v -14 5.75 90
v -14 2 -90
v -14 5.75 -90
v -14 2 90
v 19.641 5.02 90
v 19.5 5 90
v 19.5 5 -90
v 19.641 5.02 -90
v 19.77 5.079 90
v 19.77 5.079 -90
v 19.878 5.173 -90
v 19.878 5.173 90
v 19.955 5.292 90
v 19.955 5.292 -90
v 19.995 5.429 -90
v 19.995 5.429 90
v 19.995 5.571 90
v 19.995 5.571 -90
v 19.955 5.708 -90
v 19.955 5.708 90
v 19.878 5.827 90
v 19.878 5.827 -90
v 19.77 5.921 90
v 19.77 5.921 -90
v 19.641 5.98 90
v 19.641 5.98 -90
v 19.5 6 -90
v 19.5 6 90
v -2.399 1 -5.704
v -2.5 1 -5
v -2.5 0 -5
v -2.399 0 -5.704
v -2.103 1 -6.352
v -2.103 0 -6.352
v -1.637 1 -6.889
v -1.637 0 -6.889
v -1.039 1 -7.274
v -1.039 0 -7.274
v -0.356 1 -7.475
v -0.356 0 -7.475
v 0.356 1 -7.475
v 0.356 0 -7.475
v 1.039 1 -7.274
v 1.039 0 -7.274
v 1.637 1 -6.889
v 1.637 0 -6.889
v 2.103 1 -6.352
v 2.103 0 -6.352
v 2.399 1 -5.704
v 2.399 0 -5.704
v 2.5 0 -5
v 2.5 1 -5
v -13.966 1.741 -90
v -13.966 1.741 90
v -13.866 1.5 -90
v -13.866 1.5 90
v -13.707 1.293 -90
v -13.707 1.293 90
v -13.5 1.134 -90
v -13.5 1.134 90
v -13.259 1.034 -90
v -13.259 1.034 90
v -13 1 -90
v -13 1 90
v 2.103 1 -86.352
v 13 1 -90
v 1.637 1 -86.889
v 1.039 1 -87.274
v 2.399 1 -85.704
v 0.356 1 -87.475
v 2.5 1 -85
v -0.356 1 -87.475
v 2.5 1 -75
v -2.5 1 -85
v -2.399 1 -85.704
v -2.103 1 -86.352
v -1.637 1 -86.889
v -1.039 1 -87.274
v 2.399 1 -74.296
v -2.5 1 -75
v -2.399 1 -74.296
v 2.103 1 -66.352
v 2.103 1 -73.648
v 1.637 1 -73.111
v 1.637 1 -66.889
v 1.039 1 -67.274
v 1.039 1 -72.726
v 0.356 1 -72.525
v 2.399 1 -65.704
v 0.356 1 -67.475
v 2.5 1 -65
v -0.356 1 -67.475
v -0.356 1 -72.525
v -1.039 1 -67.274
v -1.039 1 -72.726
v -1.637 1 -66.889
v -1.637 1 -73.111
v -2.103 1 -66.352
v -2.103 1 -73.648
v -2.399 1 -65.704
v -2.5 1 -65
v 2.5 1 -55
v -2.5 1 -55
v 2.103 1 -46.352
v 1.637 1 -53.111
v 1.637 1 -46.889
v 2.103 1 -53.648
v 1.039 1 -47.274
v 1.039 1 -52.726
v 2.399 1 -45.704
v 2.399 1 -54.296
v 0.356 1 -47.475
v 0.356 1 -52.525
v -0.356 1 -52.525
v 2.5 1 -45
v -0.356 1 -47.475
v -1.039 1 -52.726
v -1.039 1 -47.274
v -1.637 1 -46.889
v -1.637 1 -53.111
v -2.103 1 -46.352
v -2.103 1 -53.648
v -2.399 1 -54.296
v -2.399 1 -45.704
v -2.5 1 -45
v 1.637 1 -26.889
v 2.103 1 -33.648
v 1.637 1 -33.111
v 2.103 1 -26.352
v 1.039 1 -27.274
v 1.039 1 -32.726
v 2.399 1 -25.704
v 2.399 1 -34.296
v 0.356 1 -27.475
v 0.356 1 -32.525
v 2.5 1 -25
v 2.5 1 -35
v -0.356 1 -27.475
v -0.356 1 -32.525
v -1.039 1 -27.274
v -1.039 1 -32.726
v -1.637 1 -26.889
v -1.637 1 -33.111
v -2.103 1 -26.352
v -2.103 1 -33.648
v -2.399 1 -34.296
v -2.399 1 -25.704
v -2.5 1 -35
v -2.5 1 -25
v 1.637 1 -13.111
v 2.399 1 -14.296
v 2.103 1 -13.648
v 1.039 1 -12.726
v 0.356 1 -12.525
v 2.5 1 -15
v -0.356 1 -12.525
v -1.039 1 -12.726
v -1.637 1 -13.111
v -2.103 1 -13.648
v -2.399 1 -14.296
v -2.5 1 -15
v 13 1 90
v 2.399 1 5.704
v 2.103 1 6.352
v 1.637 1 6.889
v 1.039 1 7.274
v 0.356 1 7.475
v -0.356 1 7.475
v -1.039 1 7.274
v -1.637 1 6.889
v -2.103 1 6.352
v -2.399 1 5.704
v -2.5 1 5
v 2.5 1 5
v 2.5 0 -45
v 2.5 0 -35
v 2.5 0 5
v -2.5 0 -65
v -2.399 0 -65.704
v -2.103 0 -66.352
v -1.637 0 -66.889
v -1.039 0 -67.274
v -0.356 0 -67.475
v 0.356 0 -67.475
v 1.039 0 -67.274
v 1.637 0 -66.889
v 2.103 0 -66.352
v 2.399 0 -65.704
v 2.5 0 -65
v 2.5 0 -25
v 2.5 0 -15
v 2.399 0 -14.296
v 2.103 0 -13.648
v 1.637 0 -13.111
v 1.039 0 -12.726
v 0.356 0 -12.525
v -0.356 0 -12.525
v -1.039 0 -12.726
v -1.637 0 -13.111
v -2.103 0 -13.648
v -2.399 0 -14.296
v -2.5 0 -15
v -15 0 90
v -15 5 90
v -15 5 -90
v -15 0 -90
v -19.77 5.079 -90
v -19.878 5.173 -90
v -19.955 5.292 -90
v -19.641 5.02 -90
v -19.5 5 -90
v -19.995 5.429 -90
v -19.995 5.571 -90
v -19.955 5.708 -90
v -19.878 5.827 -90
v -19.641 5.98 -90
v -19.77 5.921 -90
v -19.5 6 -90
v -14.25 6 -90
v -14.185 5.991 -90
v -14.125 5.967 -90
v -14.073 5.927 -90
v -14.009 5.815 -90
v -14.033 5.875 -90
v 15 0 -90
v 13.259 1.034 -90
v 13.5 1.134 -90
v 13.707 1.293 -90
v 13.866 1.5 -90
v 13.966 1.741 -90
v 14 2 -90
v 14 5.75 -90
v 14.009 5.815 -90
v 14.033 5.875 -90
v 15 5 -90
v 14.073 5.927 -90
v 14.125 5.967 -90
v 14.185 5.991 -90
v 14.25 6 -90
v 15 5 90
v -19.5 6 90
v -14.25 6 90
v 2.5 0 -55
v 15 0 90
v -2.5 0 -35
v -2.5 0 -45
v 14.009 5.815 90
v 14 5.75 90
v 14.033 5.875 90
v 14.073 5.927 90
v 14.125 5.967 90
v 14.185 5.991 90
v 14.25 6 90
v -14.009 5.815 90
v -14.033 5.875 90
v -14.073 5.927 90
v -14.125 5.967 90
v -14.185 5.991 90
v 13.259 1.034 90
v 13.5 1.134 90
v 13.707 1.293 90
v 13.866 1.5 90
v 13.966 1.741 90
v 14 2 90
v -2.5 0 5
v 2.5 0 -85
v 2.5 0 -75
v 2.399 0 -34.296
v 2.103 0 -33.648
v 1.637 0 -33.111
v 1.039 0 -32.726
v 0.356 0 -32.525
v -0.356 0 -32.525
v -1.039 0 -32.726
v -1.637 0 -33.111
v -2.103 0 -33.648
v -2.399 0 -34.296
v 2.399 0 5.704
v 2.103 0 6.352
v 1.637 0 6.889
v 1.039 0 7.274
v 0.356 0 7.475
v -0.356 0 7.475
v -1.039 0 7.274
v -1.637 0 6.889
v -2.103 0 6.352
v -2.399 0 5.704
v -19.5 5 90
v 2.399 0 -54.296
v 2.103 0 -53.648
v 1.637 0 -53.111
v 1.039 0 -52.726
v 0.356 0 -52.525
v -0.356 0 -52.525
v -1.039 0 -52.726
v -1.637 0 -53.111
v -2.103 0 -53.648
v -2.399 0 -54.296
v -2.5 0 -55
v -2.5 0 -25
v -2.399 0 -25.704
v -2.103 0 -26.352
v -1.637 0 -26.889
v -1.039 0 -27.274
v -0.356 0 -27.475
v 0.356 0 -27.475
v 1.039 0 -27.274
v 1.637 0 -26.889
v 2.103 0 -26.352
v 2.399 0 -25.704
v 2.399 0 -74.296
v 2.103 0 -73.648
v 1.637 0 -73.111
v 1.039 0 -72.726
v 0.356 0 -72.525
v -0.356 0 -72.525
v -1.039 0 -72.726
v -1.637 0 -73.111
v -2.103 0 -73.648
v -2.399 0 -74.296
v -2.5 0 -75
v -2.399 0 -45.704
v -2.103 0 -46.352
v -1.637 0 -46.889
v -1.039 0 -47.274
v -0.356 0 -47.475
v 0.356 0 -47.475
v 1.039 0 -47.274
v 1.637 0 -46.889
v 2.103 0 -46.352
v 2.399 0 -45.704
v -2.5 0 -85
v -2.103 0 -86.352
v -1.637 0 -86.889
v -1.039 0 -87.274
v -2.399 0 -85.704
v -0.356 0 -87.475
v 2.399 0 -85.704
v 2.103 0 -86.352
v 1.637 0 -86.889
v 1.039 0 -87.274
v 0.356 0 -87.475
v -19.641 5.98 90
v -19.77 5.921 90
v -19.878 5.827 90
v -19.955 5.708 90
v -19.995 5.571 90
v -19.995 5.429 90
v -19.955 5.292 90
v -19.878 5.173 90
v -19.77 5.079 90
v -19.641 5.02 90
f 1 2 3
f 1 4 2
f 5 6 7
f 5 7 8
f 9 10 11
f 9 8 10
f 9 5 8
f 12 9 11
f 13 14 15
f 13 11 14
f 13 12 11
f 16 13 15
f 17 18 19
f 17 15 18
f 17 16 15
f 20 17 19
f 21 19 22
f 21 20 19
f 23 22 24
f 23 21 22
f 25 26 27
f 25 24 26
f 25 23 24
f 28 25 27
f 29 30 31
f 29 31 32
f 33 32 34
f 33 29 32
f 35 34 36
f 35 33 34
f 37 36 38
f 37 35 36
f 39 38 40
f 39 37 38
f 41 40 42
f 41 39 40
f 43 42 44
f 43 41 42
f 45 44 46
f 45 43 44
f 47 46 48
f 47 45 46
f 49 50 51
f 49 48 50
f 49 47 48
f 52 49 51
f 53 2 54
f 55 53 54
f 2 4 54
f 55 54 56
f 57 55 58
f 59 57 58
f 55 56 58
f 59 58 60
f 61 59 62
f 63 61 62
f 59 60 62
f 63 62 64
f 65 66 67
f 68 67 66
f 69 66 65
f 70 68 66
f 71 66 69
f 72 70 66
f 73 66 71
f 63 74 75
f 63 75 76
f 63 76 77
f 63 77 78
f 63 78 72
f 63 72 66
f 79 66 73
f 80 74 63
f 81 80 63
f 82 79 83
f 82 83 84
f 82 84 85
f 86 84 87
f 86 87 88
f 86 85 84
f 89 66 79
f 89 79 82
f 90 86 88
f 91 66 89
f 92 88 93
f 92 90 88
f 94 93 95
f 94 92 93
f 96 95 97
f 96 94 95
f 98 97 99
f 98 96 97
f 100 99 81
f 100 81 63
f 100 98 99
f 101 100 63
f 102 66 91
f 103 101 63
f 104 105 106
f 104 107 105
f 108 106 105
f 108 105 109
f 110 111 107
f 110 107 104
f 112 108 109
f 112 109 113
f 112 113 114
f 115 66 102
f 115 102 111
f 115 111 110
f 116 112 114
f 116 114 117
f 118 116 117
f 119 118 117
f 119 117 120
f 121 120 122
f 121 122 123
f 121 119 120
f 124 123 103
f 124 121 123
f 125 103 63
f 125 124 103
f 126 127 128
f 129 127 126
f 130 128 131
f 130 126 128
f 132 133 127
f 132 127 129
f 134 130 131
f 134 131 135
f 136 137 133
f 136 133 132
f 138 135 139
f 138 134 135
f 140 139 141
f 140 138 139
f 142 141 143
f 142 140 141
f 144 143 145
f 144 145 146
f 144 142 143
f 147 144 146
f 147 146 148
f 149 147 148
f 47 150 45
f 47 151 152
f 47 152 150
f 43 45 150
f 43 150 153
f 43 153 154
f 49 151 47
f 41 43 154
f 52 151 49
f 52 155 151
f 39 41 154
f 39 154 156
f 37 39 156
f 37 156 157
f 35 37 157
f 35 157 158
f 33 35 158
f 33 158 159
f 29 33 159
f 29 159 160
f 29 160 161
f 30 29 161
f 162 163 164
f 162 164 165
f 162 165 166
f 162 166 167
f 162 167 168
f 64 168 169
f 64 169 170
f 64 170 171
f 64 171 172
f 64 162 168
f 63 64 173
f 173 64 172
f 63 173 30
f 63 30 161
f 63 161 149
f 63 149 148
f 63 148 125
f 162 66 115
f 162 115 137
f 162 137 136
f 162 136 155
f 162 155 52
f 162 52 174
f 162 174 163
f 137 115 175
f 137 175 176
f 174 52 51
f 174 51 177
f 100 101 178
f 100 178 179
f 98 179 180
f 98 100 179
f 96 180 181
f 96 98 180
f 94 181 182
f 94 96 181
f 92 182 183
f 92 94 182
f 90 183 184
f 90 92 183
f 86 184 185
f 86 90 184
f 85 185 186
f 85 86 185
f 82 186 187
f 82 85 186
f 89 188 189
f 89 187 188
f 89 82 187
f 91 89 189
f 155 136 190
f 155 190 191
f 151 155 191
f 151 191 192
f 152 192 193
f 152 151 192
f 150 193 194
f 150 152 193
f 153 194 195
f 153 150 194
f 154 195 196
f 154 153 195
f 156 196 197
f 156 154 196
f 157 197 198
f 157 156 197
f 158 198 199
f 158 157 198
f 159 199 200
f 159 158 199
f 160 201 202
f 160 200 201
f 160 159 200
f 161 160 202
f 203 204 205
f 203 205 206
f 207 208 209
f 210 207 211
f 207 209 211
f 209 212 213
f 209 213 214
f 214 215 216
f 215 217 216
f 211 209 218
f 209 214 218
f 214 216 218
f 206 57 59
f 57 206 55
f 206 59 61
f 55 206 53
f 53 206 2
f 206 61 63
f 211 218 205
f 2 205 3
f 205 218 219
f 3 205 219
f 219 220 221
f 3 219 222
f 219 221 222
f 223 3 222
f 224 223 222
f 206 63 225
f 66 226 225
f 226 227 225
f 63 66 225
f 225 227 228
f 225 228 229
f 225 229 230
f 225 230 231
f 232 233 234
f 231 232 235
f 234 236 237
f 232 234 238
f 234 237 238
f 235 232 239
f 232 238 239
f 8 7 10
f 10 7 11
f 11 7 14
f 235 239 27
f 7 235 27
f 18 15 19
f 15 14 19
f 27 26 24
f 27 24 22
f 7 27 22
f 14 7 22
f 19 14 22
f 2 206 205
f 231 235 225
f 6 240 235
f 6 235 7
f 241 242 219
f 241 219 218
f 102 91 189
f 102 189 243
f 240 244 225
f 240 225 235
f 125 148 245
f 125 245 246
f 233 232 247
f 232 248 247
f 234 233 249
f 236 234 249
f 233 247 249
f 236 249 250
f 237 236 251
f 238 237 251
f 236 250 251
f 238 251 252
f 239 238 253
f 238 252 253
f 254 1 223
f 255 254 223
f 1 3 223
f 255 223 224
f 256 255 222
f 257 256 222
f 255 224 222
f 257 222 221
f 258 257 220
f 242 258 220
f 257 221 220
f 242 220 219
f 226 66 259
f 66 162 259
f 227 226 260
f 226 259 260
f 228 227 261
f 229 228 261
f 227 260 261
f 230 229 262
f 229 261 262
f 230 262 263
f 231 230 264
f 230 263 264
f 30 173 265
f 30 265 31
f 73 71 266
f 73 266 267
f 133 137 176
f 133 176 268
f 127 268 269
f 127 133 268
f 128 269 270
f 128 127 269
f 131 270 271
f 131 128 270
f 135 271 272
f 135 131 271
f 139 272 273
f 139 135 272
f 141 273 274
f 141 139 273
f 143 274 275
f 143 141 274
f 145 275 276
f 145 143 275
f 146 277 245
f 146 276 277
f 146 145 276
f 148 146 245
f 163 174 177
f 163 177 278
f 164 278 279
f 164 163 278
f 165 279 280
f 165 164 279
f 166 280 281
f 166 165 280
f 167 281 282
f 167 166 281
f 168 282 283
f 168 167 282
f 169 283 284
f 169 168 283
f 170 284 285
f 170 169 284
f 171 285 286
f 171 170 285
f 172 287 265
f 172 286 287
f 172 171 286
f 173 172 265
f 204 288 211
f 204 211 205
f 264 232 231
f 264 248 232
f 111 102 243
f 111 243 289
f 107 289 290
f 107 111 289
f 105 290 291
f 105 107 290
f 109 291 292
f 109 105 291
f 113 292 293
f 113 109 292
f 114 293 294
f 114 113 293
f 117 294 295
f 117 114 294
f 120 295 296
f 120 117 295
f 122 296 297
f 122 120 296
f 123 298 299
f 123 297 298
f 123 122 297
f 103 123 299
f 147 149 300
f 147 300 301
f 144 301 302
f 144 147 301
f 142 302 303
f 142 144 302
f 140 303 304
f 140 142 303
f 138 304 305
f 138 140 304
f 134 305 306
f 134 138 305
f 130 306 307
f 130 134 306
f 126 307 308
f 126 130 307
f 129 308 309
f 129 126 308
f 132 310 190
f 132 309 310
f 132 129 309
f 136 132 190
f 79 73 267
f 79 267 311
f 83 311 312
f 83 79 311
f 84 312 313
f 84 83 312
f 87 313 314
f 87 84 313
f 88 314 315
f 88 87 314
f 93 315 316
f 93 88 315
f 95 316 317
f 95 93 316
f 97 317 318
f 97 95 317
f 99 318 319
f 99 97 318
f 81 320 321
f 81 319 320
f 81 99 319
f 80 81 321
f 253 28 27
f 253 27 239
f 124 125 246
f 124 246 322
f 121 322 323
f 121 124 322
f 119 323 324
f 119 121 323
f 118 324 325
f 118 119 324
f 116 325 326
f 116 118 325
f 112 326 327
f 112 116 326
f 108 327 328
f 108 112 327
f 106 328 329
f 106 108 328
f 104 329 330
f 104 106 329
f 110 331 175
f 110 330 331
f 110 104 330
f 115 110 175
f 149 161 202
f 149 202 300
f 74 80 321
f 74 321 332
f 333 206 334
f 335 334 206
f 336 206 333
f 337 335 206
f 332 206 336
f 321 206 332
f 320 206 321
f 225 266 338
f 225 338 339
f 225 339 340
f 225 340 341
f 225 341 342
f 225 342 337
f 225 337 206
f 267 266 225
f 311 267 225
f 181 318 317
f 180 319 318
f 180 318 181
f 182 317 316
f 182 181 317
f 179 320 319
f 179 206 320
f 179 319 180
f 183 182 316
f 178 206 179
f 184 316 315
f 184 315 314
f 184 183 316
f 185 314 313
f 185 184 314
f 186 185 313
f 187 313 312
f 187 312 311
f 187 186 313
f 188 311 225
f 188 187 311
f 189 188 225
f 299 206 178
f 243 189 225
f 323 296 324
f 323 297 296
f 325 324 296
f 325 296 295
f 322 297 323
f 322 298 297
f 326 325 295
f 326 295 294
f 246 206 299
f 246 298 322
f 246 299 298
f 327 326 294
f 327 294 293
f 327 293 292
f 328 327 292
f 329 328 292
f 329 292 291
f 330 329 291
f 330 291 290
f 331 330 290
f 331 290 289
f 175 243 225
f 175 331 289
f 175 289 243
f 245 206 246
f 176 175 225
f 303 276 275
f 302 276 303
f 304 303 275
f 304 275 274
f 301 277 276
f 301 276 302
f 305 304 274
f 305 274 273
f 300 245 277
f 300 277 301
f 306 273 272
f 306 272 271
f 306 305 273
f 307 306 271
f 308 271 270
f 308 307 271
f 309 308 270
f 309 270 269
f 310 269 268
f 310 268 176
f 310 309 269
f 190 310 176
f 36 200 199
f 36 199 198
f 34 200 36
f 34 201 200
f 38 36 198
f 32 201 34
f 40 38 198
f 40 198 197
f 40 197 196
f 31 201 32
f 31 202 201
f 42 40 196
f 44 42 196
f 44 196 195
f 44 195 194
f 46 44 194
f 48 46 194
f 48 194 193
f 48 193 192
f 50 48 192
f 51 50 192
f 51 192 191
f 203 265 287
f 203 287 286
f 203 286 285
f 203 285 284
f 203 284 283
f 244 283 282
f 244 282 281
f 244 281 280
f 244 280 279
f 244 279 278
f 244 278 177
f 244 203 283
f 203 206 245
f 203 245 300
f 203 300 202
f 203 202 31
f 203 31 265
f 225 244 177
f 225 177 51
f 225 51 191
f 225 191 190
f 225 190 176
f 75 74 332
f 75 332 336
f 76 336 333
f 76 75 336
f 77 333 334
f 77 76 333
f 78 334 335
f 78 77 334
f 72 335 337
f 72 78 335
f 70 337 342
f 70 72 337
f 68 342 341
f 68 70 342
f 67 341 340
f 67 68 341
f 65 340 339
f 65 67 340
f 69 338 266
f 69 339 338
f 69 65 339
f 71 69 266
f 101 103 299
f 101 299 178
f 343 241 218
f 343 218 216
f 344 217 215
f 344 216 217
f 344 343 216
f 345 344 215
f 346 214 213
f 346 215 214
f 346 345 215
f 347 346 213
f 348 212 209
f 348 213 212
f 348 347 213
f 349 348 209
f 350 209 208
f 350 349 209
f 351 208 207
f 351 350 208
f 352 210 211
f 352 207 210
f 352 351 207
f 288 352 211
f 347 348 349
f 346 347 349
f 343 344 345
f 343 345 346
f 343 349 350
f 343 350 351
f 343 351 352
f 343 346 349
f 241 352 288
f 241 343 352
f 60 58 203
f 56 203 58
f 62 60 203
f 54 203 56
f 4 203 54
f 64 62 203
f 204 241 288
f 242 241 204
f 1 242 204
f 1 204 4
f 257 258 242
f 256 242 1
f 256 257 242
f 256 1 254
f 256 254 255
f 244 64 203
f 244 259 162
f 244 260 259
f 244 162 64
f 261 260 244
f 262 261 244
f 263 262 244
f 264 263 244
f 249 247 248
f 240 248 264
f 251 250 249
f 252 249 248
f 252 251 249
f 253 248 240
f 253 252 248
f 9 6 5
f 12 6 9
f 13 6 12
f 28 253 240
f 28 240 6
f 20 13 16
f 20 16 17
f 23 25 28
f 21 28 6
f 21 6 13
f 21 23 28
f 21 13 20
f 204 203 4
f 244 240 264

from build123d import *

# Parameters (mm, degrees)
EXTRUDE_THIN1_DEPTH = 90
FILLET1_R           = 1
FILLET2_R           = 0.25
FILLET3_RADIUS      = 0.5
FILLET3_LENGTH      = 180
FILLET4_RADIUS      = 0.5
FILLET4_LENGTH      = 180
CUT_EXTRUDE1_DEPTH  = 93.330926563
LPATTERN1_COUNT     = 5
LPATTERN1_PITCH     = 20


with BuildPart() as part:
    # Sketch1 → Extrude-Thin1 (new, symmetric)
    with BuildSketch(Plane.XY):
        Polygon((-20, 5), (-15, 5), (-15, 0), (15, 0), (15, 5), (20, 5), (20, 6), (14, 6), (14, 1), (-14, 1), (-14, 6), (-20, 6), align=None)
    extrude(amount=EXTRUDE_THIN1_DEPTH, both=True)

    # Fillet1
    fillet1_edges = [part.edges().sort_by_distance(p)[0] for p in [
        (-14, 1, 0),
        (14, 1, 0),
    ]]
    fillet(fillet1_edges, radius=FILLET1_R)

    # Fillet2
    fillet2_edges = [part.edges().sort_by_distance(p)[0] for p in [
        (-14, 6, 0),
        (14, 6, 0),
    ]]
    fillet(fillet2_edges, radius=FILLET2_R)

    # Fillet3: full round fillet: the end face becomes a half cylinder, R = half its width
    fillet3_face = Plane((20, 5.5, 0), x_dir=(0, 0, 1), z_dir=(1, 0, 0))  # on the end face: x along it, z out of the body
    fillet3_slab = fillet3_face.offset(-FILLET3_RADIUS / 2) * Box(FILLET3_LENGTH, 2 * FILLET3_RADIUS, FILLET3_RADIUS, mode=Mode.PRIVATE)  # the body's end, R deep
    fillet3_round = Plane((19.5, 5.5, 0), x_dir=(1, 0, 0), z_dir=(0, 0, 1)) * Cylinder(FILLET3_RADIUS, FILLET3_LENGTH, mode=Mode.PRIVATE)  # its axis R under the face
    add(fillet3_slab - fillet3_round, mode=Mode.SUBTRACT)

    # Fillet4: full round fillet: the end face becomes a half cylinder, R = half its width
    fillet4_face = Plane((-20, 5.5, 0), x_dir=(0, 0, 1), z_dir=(-1, 0, 0))  # on the end face: x along it, z out of the body
    fillet4_slab = fillet4_face.offset(-FILLET4_RADIUS / 2) * Box(FILLET4_LENGTH, 2 * FILLET4_RADIUS, FILLET4_RADIUS, mode=Mode.PRIVATE)  # the body's end, R deep
    fillet4_round = Plane((-19.5, 5.5, 0), x_dir=(-1, 0, 0), z_dir=(0, 0, 1)) * Cylinder(FILLET4_RADIUS, FILLET4_LENGTH, mode=Mode.PRIVATE)  # its axis R under the face
    add(fillet4_slab - fillet4_round, mode=Mode.SUBTRACT)

    # Sketch2 → Cut-Extrude1 (cut, through all)
    with BuildSketch(Plane(origin=(0, 1, 0), x_dir=(1, 0, 0), z_dir=(0, 1, 0))):
        with BuildLine():
            Line((-2.5, -5), (-2.5, 5))
            ThreePointArc((-2.5, 5), (0, 7.5), (2.5, 5))
            Line((2.5, 5), (2.5, -5))
            ThreePointArc((2.5, -5), (0, -7.5), (-2.5, -5))
        make_face()
    cut_extrude1 = extrude(amount=-CUT_EXTRUDE1_DEPTH, mode=Mode.SUBTRACT)

    # LPattern1: Cut-Extrude1 ×5
    with Locations(*[(0, 0, -i * LPATTERN1_PITCH) for i in range(1, LPATTERN1_COUNT)]):
        add(cut_extrude1, mode=Mode.SUBTRACT)


solid = part.part
